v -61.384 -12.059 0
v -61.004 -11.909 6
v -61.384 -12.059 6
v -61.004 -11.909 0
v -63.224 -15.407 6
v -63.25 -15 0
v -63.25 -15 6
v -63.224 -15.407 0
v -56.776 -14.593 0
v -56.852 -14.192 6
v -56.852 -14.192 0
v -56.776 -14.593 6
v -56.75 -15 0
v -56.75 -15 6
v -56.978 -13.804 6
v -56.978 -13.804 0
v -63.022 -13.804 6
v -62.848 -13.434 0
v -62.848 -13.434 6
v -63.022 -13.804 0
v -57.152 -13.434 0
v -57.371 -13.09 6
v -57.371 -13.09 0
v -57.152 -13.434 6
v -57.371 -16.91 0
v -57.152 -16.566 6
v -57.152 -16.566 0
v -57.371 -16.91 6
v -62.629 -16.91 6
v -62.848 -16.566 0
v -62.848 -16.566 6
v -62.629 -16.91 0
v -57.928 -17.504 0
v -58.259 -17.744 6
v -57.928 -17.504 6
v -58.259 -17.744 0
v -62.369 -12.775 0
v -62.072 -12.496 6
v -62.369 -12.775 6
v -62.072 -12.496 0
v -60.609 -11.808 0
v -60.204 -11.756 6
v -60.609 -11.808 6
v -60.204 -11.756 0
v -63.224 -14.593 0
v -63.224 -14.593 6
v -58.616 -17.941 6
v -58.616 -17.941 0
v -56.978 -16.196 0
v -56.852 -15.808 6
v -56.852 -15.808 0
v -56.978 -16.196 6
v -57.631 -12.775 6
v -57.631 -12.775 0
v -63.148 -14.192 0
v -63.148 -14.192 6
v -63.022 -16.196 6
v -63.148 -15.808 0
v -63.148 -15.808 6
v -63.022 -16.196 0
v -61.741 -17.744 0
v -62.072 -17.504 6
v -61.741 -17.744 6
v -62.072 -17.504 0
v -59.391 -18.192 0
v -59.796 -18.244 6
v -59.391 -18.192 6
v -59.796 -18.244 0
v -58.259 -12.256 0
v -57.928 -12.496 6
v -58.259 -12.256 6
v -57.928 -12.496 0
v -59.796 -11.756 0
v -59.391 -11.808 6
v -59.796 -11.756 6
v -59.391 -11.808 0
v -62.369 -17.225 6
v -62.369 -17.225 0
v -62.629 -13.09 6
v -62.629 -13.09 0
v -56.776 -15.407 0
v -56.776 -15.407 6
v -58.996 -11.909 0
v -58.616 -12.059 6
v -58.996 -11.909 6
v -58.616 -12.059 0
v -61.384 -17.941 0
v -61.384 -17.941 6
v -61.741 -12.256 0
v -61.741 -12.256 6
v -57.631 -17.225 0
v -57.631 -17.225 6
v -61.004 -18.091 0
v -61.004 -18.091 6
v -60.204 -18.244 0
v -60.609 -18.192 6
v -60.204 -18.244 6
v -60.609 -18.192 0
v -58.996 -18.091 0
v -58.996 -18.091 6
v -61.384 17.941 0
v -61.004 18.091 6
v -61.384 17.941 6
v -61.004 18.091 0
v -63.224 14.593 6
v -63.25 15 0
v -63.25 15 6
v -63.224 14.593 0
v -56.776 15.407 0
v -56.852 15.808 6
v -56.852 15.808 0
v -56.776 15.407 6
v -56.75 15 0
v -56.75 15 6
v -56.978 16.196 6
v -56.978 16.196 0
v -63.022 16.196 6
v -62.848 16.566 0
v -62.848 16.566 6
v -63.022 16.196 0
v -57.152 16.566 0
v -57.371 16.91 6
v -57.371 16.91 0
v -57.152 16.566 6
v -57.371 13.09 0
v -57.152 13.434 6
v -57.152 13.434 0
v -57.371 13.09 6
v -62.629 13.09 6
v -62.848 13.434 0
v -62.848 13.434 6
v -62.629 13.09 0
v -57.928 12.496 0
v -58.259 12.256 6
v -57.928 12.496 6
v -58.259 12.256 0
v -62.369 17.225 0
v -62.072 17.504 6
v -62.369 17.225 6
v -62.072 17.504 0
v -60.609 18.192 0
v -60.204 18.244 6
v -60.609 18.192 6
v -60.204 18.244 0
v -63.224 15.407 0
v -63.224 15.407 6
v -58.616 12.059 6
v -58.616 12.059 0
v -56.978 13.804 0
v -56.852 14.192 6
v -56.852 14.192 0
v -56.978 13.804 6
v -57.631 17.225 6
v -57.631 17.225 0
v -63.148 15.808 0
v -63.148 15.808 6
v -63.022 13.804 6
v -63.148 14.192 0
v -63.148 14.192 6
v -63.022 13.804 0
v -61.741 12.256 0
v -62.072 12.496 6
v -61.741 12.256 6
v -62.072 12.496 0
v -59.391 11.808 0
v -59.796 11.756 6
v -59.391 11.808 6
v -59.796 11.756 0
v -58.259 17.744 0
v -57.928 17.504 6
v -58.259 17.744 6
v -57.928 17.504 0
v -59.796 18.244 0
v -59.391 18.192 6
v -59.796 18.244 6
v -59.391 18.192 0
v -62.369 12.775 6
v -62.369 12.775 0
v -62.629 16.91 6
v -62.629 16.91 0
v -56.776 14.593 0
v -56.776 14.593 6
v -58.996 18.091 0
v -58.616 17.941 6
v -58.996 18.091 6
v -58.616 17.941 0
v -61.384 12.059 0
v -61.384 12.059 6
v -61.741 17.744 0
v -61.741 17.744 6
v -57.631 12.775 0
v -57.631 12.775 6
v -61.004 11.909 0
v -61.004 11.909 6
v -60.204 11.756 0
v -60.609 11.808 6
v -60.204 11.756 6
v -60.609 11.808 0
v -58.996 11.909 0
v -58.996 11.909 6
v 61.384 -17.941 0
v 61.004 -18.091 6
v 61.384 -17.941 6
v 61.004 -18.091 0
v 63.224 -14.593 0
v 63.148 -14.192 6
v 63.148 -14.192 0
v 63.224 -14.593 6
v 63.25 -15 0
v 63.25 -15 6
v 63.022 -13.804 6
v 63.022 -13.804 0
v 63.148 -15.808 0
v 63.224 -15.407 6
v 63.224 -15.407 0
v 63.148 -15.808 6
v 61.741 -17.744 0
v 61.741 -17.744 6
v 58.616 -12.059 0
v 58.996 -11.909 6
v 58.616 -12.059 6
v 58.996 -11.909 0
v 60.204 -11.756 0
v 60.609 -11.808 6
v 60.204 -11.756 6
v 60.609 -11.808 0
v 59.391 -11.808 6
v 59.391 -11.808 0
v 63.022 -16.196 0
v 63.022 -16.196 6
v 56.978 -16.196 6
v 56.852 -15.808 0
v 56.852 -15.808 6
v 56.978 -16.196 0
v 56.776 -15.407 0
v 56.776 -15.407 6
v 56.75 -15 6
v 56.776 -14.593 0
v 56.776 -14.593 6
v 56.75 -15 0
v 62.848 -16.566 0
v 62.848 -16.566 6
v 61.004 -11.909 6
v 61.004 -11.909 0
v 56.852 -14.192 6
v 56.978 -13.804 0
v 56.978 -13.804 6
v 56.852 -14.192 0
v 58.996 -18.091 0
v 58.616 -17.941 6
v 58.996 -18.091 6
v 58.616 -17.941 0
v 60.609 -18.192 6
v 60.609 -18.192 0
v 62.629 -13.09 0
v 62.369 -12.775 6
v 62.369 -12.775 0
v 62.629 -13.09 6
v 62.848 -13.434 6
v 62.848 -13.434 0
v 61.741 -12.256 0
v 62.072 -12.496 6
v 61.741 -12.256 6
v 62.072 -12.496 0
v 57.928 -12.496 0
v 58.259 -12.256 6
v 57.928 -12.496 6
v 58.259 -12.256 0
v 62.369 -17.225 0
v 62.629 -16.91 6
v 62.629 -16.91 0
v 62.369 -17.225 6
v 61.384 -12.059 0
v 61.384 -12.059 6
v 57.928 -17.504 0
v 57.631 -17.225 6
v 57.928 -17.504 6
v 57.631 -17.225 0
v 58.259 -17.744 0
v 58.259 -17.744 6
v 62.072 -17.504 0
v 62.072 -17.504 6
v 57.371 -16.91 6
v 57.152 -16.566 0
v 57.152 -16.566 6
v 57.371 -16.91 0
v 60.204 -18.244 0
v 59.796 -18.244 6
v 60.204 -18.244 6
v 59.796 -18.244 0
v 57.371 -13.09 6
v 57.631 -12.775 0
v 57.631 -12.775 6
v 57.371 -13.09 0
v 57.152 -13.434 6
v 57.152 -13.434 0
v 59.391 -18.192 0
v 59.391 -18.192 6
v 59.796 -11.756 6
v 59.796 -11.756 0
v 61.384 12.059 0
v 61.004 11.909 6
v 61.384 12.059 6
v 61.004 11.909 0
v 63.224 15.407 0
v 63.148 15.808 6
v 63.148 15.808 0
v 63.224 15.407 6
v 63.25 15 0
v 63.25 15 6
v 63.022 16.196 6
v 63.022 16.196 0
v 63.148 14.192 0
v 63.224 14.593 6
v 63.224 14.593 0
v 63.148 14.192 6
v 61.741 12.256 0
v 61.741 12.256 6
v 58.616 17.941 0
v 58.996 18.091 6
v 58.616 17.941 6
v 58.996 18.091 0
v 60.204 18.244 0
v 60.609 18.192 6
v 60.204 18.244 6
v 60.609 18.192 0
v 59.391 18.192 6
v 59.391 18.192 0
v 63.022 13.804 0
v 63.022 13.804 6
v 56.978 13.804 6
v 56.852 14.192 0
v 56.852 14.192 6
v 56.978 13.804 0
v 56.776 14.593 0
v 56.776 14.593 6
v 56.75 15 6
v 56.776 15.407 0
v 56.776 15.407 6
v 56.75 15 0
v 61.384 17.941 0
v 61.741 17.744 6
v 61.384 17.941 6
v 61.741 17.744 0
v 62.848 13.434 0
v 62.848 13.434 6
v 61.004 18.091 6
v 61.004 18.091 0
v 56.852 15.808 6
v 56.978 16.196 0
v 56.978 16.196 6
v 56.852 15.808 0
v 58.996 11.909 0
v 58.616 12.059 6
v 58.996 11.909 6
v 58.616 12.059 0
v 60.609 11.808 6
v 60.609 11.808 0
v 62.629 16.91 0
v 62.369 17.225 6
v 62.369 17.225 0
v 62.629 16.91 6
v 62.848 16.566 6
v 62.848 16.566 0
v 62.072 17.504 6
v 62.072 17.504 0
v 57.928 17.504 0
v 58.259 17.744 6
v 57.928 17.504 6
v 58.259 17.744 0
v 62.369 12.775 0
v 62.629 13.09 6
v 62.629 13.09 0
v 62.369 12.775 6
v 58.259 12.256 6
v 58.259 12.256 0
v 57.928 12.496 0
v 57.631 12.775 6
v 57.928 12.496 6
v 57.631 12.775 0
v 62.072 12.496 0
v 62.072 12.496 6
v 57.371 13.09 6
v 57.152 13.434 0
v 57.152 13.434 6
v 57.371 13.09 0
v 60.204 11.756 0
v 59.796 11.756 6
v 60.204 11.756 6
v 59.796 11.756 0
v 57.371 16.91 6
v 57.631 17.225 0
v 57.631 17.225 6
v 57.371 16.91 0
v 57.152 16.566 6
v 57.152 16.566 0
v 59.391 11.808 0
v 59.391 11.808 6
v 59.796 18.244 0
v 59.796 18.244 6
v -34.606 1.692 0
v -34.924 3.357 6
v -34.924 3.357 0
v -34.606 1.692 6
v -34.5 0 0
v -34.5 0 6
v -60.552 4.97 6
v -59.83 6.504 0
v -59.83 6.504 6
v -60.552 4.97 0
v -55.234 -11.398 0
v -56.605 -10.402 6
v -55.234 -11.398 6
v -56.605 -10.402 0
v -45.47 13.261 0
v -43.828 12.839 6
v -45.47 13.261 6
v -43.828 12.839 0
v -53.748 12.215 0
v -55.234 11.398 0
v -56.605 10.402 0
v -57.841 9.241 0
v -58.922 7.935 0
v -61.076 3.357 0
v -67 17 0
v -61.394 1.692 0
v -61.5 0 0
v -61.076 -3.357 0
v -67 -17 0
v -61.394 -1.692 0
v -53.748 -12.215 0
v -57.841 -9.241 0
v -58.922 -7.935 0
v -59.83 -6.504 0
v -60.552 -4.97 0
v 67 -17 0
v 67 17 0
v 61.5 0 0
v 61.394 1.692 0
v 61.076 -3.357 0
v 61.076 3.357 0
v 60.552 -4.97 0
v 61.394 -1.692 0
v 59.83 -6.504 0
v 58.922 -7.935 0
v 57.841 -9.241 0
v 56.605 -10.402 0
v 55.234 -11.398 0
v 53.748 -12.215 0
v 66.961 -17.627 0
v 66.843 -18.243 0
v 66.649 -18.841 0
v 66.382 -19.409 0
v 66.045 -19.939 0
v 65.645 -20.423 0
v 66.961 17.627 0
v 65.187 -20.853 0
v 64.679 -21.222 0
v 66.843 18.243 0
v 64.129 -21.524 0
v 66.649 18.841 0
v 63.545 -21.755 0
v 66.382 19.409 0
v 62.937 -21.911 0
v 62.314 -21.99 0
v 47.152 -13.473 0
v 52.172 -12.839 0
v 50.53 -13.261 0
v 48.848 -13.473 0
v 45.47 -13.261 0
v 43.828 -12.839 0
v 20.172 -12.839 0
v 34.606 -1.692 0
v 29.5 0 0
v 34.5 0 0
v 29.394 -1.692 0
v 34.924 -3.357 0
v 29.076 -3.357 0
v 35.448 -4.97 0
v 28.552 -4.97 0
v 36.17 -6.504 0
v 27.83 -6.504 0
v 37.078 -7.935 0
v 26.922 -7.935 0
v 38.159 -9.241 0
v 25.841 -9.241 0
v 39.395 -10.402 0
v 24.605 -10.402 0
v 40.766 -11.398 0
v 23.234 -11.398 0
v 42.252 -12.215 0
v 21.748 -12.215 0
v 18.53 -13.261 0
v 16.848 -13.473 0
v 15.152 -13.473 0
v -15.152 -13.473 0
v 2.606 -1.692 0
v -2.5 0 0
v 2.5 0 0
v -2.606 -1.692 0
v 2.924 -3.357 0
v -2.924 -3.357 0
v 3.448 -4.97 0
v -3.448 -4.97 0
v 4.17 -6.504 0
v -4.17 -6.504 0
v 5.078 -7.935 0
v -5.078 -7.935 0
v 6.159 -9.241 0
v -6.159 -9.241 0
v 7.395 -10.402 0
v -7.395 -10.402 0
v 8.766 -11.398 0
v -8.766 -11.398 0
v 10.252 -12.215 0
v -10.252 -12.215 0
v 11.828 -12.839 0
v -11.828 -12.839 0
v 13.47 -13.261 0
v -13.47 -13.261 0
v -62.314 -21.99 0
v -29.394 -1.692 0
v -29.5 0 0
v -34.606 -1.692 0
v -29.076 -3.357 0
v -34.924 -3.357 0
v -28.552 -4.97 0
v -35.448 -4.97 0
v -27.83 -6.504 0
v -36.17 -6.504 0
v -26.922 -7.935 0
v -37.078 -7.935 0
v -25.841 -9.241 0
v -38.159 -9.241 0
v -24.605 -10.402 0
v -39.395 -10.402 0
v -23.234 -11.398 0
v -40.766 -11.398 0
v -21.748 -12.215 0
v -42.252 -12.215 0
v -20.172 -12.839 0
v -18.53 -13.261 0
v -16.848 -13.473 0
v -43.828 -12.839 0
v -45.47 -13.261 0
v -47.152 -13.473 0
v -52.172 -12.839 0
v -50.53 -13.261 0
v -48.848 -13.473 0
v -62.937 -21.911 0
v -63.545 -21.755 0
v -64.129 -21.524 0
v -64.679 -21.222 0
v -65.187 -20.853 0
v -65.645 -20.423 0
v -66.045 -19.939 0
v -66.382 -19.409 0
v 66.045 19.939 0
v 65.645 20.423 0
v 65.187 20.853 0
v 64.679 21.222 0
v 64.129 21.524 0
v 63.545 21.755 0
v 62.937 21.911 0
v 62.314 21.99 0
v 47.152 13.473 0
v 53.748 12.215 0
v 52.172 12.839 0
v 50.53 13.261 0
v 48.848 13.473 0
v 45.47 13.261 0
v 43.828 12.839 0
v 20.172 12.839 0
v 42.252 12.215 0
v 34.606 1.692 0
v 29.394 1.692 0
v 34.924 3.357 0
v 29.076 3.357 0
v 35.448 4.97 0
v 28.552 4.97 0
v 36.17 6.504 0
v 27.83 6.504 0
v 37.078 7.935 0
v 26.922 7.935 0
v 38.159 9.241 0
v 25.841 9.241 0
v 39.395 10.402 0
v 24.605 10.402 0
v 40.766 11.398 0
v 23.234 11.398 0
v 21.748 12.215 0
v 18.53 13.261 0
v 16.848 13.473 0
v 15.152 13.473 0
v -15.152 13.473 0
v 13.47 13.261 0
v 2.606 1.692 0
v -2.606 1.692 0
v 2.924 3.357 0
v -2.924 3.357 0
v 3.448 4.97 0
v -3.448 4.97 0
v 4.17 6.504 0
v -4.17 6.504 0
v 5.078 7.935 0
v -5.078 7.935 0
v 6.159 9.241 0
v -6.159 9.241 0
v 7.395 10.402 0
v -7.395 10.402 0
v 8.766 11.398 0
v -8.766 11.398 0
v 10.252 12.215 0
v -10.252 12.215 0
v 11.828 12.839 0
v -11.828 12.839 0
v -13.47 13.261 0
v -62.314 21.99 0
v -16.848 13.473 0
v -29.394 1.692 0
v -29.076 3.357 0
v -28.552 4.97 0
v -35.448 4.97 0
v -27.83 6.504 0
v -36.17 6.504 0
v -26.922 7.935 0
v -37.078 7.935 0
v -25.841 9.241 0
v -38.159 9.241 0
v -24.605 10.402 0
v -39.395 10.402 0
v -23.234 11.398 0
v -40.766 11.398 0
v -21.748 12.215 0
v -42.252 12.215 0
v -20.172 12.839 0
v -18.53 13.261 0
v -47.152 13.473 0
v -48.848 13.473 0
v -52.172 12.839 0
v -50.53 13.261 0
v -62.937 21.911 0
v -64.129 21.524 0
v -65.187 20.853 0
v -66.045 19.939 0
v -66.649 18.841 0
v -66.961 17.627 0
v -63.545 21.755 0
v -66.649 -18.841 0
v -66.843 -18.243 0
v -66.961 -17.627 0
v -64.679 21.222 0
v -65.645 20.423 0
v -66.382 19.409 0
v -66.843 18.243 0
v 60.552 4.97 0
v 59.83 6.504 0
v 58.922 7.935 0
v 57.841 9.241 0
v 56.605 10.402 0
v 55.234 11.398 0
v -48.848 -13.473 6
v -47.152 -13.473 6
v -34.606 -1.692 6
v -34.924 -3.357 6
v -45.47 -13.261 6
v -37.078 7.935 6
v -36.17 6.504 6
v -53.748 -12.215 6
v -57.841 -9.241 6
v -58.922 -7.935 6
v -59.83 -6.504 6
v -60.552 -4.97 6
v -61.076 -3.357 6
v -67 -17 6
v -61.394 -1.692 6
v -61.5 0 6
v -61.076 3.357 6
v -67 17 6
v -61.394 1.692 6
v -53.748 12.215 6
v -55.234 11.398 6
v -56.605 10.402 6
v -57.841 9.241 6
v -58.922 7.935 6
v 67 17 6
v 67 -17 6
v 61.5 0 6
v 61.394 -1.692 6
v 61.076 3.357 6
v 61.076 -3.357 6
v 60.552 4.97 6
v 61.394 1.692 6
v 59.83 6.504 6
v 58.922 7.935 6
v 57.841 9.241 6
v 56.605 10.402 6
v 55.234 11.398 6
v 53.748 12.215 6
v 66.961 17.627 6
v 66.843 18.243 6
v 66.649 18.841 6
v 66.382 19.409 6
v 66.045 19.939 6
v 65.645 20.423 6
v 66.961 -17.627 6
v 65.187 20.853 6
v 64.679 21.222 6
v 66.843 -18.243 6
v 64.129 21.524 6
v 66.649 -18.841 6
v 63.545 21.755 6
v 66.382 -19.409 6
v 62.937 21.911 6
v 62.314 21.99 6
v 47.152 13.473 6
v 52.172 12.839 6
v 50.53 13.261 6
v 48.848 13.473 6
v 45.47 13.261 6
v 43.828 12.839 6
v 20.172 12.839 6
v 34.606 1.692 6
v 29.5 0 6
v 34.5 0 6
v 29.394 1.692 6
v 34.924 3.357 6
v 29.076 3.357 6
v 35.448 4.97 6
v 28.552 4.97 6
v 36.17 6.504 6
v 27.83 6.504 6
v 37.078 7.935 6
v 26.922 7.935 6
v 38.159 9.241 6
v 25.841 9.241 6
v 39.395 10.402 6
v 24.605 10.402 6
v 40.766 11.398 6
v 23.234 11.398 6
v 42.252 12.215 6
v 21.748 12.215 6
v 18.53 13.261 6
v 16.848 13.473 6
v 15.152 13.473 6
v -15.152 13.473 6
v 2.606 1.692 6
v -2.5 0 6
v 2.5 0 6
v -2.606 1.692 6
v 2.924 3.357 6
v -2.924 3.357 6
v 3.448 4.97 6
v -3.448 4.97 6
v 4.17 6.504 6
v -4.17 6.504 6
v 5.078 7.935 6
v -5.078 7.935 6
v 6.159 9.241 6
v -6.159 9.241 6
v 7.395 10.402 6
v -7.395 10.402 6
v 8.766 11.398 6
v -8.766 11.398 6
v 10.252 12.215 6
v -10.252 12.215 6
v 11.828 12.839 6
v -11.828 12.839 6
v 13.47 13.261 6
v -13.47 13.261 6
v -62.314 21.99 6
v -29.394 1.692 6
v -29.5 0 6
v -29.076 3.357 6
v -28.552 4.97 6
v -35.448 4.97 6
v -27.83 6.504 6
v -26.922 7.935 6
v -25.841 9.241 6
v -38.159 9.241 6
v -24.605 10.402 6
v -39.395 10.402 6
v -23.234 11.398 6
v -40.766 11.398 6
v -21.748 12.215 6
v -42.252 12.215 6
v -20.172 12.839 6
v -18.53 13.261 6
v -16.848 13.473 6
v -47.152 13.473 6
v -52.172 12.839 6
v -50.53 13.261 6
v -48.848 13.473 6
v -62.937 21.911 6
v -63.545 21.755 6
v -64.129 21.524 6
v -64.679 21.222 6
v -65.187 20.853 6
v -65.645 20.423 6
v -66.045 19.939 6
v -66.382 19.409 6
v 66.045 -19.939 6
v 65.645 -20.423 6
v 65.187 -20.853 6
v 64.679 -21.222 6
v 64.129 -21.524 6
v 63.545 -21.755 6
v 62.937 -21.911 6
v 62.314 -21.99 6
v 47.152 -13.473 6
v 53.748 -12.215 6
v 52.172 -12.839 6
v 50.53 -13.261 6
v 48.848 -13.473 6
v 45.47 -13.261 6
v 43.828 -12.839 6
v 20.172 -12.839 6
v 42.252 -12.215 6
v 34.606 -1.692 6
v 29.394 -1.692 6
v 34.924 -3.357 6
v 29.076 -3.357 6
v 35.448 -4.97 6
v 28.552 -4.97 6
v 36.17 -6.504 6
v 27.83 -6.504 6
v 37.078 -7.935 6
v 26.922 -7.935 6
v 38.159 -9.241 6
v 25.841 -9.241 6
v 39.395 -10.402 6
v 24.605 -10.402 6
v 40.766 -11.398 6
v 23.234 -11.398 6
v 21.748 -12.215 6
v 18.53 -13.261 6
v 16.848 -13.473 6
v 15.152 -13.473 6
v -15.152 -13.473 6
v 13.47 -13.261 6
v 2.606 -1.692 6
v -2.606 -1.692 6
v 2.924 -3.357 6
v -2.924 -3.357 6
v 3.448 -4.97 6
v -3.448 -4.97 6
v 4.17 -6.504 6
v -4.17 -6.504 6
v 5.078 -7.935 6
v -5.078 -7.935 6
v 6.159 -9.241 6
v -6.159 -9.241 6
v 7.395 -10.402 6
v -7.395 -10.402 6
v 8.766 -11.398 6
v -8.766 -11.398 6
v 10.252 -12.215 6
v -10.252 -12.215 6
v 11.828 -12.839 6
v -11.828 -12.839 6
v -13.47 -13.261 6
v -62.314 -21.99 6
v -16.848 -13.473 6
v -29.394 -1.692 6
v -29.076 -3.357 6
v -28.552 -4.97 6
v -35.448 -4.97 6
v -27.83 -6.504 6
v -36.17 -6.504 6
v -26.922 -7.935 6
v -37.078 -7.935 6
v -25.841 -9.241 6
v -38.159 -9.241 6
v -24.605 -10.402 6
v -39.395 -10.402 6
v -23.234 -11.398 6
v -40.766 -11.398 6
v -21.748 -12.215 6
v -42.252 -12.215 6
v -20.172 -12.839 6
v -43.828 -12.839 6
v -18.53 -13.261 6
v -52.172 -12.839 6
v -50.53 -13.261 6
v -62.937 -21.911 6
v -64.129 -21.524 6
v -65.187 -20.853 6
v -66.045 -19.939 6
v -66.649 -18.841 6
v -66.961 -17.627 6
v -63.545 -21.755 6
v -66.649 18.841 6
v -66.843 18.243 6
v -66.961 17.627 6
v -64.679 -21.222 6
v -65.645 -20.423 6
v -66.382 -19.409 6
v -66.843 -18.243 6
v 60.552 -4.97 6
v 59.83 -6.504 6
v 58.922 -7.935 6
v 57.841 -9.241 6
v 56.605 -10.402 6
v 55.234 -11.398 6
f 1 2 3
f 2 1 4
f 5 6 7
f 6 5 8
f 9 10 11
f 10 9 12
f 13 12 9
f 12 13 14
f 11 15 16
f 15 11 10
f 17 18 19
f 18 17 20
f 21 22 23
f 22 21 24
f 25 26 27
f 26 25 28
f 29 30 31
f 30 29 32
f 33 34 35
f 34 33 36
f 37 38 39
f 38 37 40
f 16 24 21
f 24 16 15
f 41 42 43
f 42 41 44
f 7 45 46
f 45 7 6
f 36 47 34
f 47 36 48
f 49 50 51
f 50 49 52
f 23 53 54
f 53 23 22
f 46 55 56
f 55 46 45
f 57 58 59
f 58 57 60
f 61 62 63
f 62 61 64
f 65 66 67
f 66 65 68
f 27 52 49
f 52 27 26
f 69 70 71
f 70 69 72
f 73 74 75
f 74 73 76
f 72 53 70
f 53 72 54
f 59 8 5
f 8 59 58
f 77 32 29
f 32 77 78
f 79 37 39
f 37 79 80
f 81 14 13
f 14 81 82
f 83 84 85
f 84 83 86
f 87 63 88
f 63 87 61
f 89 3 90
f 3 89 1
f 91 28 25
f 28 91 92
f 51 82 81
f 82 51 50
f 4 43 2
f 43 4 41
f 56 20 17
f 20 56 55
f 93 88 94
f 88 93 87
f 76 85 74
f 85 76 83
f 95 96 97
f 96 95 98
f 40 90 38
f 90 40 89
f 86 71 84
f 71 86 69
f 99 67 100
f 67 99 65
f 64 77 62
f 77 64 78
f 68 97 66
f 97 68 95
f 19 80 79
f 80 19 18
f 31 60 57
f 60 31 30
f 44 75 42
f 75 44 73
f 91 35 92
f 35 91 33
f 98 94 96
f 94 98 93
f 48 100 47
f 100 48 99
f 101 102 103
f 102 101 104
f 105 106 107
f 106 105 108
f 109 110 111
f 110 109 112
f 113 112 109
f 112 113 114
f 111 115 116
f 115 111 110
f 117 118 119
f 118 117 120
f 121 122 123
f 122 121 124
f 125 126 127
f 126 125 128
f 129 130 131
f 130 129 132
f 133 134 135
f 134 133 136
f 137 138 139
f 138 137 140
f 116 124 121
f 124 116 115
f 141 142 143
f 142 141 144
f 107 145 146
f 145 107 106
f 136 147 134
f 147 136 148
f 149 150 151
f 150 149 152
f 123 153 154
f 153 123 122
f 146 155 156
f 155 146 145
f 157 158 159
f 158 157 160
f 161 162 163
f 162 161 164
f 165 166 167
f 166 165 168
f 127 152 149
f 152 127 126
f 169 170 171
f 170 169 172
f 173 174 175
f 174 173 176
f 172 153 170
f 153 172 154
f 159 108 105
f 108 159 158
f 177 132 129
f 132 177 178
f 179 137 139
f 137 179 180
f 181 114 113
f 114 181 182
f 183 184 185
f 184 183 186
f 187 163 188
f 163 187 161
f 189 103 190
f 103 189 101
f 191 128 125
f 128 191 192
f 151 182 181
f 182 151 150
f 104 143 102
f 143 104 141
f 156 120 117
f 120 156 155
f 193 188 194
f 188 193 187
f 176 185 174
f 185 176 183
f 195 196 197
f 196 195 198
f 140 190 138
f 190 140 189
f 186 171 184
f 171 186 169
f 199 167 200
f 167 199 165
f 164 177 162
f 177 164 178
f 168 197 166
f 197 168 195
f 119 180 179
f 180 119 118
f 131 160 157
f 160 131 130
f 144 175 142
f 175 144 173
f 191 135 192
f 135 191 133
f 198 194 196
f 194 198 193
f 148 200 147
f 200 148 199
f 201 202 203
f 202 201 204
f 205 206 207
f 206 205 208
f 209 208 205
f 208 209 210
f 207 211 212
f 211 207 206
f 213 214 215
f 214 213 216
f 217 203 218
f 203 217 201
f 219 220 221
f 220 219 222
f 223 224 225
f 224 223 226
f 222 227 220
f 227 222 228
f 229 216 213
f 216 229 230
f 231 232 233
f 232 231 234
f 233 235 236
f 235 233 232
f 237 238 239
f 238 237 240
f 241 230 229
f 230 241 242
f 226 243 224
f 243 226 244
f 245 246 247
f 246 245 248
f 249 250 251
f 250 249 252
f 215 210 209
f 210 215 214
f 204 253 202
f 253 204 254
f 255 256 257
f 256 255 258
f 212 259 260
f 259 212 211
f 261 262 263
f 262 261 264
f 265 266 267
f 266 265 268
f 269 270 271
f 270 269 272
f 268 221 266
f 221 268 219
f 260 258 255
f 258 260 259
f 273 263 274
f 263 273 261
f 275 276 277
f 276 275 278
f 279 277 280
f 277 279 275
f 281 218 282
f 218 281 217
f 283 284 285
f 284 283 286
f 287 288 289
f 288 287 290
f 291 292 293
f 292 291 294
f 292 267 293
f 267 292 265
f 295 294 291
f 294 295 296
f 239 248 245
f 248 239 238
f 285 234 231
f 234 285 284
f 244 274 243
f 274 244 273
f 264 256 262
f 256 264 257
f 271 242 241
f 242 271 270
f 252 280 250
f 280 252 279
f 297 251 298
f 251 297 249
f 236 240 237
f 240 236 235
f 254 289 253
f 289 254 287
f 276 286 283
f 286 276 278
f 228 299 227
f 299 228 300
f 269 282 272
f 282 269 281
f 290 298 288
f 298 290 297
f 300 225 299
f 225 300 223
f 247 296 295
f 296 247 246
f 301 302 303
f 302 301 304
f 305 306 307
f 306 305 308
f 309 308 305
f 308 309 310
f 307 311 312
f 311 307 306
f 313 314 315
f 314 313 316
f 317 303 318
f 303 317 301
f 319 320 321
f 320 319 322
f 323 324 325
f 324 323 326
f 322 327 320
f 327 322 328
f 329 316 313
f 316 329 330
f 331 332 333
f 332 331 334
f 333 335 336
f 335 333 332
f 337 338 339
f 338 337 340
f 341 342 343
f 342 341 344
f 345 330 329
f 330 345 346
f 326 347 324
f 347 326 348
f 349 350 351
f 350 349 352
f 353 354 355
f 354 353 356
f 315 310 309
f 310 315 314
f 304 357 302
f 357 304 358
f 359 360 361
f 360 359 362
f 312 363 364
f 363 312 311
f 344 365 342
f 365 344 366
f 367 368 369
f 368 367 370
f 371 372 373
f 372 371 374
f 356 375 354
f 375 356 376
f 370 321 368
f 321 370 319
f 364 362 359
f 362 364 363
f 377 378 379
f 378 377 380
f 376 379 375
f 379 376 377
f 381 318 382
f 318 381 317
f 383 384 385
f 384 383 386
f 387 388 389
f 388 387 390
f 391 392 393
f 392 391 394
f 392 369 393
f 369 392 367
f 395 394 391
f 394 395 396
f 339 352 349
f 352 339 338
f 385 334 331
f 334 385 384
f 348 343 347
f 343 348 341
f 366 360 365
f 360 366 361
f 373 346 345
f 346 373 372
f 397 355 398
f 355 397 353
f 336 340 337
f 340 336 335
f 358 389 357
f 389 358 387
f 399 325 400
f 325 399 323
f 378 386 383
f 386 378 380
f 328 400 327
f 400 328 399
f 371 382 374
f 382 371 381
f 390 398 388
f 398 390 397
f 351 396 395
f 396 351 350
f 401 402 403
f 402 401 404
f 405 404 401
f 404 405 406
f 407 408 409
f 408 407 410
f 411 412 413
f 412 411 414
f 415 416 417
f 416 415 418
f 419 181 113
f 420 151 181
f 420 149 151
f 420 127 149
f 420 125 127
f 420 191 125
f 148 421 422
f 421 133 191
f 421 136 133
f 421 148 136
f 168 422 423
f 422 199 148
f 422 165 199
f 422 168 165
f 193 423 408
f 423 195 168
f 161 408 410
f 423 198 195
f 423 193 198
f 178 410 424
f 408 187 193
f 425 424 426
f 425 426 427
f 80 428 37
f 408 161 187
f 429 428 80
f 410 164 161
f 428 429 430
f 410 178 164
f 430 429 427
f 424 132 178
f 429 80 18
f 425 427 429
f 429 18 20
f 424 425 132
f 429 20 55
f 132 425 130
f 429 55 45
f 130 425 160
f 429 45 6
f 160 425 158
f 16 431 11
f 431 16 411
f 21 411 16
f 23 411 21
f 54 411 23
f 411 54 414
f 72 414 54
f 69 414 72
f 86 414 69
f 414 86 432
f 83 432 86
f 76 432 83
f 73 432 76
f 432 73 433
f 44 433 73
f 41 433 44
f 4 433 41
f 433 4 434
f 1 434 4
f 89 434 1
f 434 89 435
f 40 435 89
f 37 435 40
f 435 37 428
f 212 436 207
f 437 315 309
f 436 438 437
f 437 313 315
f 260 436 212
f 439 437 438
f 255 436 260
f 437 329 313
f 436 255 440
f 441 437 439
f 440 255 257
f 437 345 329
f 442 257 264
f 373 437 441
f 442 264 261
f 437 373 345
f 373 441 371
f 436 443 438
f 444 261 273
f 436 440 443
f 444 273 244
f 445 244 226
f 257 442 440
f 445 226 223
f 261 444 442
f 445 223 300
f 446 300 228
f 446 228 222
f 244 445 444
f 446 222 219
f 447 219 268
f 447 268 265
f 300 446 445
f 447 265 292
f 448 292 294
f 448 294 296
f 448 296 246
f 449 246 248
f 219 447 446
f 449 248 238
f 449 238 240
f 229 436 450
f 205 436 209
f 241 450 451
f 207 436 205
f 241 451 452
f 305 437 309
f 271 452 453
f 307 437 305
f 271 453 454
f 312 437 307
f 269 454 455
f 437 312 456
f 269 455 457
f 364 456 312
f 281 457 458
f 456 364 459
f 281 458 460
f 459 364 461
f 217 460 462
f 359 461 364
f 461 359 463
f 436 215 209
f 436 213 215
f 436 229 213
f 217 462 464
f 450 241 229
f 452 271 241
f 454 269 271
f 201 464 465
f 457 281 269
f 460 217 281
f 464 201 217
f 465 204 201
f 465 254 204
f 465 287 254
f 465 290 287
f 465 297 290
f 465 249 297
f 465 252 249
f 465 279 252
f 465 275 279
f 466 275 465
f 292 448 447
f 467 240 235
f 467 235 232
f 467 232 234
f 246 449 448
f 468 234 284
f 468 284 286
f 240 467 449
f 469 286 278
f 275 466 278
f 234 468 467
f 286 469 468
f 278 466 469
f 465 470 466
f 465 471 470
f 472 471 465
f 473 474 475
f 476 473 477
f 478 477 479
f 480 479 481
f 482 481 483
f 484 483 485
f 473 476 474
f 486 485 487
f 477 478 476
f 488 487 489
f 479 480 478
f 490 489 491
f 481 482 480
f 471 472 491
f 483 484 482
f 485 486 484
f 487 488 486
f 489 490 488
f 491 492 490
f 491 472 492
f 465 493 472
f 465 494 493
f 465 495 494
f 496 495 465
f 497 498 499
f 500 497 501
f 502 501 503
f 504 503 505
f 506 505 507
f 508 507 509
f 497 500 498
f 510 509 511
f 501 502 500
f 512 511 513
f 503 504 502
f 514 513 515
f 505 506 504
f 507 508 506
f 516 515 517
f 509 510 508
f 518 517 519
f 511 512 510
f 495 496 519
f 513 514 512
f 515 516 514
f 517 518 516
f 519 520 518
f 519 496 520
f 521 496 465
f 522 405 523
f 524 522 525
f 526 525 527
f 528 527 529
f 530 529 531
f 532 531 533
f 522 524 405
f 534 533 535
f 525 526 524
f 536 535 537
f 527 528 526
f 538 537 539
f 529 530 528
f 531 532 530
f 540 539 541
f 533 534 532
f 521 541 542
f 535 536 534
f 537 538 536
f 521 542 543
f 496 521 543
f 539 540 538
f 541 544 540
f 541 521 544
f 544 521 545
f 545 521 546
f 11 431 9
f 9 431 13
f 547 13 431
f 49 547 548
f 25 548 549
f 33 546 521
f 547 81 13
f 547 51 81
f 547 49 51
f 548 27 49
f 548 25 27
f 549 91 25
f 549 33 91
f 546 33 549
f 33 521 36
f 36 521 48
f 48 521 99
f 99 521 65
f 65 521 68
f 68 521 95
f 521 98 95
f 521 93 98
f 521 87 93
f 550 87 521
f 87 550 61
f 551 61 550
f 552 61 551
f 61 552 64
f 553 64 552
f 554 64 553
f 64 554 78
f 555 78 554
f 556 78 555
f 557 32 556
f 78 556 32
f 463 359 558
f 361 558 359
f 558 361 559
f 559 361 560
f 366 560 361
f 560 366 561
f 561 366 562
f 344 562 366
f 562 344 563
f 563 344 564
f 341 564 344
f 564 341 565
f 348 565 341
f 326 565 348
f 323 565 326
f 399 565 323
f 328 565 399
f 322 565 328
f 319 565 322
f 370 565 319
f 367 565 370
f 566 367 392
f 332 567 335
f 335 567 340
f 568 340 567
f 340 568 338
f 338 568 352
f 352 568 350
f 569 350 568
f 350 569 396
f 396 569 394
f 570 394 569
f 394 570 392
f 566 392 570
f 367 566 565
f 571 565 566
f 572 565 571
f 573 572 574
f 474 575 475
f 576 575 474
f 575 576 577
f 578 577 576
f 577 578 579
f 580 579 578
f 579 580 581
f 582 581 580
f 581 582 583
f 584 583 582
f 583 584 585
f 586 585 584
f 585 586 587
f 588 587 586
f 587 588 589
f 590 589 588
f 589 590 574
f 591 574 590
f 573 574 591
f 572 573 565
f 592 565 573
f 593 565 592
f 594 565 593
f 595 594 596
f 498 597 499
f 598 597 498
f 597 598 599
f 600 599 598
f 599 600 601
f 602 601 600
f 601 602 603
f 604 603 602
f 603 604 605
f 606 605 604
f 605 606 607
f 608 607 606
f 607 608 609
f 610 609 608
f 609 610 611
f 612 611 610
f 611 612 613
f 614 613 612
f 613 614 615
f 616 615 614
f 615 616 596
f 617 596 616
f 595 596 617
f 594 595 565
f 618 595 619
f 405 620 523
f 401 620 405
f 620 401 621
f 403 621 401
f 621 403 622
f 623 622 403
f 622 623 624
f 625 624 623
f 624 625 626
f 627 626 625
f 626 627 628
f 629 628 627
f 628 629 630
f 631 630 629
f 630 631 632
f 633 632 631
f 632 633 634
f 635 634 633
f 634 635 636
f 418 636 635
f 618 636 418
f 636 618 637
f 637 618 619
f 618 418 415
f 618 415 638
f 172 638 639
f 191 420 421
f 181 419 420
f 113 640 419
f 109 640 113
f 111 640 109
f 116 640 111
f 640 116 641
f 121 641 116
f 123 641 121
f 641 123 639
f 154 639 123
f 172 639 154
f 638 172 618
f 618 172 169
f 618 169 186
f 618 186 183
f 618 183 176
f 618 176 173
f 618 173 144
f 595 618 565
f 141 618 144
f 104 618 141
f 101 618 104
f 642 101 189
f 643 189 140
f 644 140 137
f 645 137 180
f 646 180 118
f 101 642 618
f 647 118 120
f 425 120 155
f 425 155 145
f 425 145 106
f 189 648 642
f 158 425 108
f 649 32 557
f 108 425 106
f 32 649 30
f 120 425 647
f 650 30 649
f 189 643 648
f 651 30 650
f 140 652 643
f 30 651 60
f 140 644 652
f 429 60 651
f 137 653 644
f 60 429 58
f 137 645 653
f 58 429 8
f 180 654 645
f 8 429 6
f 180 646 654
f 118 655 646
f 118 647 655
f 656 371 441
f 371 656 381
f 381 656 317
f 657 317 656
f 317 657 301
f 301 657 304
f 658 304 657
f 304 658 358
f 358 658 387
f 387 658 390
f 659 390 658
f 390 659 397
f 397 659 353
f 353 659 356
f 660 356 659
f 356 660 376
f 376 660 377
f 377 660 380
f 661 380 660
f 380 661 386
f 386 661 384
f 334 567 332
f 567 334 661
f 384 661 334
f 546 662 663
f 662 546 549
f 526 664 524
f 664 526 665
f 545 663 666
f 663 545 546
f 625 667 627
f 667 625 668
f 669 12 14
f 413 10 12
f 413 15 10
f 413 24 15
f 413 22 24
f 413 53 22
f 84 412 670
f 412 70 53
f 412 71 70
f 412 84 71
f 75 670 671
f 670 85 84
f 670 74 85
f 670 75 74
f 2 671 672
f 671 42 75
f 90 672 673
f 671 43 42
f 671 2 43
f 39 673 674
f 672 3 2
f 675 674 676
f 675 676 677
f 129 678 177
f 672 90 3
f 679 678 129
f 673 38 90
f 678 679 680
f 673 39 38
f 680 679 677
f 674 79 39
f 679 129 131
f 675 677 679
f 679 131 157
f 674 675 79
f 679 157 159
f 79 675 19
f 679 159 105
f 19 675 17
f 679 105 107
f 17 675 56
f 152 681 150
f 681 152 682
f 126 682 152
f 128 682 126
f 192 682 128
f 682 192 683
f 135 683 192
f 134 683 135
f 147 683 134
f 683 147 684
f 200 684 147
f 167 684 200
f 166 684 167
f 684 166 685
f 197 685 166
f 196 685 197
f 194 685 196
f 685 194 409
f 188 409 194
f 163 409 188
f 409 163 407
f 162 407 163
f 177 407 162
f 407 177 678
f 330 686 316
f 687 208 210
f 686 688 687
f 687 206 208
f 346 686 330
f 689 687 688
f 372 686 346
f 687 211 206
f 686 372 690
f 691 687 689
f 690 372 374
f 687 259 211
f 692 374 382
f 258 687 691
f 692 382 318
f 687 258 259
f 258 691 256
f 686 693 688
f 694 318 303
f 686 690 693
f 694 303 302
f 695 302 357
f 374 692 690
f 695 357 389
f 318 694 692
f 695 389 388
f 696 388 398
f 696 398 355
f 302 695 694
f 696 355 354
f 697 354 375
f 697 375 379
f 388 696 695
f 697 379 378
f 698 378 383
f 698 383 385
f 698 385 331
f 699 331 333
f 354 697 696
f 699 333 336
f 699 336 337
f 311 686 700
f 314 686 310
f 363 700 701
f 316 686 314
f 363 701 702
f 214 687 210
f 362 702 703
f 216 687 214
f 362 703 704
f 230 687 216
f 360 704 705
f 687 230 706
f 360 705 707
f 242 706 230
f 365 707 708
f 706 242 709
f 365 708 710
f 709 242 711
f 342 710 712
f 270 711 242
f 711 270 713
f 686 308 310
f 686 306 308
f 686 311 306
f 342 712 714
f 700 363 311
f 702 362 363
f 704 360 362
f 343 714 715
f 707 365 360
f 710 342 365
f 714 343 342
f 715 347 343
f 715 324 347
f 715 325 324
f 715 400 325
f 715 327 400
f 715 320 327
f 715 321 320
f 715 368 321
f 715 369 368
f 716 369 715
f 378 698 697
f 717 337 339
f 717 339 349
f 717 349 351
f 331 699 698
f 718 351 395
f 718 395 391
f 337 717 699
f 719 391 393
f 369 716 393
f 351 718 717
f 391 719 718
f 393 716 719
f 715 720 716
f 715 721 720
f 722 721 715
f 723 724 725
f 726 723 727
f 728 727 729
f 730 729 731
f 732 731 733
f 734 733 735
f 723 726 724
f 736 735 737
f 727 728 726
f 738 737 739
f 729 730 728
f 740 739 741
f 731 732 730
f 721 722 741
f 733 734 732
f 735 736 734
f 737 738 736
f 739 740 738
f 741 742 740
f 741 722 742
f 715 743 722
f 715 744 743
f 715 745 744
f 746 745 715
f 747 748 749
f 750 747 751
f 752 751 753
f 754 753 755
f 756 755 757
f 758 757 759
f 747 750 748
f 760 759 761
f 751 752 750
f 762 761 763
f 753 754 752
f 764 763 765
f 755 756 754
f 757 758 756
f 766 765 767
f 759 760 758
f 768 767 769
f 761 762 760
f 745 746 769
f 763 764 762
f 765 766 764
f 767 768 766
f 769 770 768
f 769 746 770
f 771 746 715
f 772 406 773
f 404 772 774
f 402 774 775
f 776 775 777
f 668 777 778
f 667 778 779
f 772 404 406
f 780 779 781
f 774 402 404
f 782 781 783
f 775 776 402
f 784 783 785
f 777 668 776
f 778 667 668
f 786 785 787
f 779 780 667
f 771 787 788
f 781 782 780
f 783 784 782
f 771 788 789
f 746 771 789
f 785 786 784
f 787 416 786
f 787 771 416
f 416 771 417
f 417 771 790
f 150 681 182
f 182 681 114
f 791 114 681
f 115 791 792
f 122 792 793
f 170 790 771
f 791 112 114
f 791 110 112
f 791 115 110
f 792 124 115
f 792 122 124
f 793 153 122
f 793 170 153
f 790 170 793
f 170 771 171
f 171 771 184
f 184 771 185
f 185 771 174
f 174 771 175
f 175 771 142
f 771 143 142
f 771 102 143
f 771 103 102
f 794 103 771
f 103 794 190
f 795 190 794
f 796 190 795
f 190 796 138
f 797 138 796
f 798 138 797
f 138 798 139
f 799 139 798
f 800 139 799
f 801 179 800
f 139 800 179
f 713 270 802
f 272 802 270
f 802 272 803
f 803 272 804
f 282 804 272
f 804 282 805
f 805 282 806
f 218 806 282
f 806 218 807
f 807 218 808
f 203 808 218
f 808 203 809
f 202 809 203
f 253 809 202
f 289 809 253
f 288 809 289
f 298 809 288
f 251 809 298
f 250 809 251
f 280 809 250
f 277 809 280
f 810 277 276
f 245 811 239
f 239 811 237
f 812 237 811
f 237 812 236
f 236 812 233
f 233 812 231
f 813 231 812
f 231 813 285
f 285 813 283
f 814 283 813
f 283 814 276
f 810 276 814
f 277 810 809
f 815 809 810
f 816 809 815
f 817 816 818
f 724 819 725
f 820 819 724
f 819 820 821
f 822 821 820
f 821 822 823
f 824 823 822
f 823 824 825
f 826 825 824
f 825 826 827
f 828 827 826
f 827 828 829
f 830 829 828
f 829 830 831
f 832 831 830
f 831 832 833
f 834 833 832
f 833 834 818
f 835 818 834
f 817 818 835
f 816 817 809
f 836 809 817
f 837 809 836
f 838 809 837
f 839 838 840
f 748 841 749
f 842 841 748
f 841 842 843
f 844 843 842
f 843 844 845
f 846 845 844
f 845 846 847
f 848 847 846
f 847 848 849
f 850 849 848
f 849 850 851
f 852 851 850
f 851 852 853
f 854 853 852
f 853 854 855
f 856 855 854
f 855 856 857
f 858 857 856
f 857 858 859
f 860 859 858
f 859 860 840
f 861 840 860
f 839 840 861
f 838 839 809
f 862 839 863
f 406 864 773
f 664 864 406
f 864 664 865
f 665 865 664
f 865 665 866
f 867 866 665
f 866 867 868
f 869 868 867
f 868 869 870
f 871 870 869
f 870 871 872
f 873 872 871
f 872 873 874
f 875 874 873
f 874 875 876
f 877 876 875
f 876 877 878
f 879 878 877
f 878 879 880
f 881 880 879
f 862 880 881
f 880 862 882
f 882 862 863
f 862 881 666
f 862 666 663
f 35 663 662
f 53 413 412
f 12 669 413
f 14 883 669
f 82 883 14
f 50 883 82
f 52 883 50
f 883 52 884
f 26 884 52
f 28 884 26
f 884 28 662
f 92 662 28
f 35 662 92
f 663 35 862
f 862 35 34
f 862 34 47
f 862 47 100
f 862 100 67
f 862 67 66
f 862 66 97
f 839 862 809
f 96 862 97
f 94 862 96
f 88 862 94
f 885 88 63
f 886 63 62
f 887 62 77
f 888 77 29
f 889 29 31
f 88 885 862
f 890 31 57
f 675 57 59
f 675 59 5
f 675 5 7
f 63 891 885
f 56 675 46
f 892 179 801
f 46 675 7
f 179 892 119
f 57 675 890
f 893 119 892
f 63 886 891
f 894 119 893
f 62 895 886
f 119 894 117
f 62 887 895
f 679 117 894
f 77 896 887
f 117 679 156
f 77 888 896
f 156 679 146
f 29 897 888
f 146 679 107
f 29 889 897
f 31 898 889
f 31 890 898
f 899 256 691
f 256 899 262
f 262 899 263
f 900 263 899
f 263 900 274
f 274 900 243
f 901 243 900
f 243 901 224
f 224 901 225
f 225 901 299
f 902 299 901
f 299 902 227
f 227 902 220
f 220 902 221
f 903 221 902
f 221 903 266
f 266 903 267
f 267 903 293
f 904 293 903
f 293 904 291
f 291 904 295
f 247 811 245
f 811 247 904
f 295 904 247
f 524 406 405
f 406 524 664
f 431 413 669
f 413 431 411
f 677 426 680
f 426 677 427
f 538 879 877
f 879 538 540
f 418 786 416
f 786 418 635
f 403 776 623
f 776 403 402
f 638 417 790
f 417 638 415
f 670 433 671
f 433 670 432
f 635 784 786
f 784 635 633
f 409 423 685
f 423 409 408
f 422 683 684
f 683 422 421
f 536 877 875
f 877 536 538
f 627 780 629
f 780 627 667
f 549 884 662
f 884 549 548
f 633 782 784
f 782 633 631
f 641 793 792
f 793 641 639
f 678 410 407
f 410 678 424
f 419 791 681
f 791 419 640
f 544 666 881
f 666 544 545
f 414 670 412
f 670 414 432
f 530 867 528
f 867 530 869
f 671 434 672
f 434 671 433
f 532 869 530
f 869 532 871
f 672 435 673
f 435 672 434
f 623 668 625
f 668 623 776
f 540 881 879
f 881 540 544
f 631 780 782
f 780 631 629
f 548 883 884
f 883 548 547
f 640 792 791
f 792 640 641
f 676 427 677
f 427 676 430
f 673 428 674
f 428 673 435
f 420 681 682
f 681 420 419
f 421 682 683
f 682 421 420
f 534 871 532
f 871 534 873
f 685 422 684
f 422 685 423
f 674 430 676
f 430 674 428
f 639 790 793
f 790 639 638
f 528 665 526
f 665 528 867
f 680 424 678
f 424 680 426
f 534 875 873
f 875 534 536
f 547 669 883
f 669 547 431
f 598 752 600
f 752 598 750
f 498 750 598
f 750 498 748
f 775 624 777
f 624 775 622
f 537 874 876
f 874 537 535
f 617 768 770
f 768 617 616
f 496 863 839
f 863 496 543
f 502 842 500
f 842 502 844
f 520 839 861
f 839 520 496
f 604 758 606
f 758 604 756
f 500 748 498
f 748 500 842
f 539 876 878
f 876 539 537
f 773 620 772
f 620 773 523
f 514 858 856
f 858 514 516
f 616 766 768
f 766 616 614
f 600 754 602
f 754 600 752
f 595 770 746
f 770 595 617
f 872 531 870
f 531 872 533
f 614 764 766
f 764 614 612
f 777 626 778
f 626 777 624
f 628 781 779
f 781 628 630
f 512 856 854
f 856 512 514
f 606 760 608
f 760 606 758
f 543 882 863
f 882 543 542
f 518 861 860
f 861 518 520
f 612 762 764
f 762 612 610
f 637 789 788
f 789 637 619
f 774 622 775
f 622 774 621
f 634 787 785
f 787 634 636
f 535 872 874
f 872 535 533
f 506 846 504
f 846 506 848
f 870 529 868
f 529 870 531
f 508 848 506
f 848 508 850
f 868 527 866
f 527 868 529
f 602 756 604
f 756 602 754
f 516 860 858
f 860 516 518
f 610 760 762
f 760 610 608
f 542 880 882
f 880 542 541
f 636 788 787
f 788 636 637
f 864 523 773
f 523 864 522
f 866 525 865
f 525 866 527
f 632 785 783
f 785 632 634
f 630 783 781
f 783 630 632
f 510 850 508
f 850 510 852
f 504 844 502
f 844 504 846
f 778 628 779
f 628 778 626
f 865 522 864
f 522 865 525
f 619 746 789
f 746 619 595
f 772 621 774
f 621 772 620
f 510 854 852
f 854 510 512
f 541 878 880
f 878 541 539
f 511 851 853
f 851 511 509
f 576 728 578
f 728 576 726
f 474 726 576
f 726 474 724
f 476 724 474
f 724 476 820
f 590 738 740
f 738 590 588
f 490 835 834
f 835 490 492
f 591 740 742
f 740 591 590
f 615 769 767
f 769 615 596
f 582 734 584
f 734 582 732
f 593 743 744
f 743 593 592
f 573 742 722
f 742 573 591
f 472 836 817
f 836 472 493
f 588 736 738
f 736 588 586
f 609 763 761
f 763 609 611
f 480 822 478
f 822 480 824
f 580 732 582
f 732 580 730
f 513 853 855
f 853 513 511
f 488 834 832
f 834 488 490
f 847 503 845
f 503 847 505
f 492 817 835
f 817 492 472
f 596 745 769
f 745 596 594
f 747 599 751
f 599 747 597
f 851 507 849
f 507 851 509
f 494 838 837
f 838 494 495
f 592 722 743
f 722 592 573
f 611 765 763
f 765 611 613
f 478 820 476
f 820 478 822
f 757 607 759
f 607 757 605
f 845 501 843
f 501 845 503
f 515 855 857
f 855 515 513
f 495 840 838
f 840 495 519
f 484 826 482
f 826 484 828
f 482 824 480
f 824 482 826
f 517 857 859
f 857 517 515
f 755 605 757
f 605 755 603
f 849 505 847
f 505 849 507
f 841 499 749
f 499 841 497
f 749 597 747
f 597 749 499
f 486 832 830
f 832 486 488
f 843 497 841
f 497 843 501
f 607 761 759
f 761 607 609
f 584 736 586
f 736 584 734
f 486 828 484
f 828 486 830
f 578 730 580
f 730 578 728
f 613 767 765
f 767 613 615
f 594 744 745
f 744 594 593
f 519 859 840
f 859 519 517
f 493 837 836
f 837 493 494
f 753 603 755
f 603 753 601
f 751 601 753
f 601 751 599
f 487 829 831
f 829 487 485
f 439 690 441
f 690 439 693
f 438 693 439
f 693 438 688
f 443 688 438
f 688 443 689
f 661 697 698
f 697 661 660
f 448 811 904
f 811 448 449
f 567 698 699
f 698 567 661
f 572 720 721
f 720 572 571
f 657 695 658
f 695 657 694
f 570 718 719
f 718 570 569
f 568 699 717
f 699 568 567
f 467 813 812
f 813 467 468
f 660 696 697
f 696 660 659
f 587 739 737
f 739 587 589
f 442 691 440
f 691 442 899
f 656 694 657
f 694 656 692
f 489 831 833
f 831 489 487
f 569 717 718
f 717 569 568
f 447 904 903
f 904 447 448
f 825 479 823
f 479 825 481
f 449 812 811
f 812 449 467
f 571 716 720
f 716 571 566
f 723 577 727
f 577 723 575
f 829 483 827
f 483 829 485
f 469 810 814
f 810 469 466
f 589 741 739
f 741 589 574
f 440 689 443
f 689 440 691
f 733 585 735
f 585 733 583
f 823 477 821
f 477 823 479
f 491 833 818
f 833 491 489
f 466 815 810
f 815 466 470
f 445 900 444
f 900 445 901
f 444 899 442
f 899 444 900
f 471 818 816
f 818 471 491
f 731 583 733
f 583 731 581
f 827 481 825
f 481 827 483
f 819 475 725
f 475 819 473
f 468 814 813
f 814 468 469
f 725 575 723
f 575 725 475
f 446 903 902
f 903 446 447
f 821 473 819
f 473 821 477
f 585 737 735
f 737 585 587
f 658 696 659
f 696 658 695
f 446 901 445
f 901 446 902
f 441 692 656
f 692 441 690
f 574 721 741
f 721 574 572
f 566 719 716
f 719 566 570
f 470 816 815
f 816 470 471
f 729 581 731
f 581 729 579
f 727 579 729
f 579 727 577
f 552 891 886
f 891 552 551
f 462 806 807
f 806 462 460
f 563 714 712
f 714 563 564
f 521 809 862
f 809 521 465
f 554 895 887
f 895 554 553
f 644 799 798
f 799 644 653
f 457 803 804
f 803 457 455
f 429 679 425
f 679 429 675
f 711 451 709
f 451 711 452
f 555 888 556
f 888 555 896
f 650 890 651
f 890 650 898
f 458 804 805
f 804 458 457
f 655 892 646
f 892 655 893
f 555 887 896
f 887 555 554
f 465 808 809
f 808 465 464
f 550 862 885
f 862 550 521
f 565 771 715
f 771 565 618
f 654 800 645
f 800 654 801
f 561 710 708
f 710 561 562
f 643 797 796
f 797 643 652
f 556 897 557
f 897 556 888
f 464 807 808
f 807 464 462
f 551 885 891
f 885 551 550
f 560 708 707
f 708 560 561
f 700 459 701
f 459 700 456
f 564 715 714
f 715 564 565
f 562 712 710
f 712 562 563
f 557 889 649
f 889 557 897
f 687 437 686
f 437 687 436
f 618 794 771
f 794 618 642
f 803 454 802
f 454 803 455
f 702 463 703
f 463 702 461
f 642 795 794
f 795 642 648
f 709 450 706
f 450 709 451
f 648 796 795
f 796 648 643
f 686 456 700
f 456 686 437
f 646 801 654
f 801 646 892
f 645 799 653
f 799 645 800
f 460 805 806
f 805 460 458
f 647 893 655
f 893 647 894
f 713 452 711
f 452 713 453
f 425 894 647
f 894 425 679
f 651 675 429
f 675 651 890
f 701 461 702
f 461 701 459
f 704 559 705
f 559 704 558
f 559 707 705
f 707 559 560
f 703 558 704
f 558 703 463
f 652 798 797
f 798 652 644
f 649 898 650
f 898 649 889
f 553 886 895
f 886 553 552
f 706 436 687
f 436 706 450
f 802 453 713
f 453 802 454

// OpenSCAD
$fn = 50;

difference() {
	union() {
		hull() {
			translate(v = [-62.0, 17.0, 0]) {
				cylinder(h = 6, r = 5);
			}
			translate(v = [62.0, 17.0, 0]) {
				cylinder(h = 6, r = 5);
			}
			translate(v = [-62.0, -17.0, 0]) {
				cylinder(h = 6, r = 5);
			}
			translate(v = [62.0, -17.0, 0]) {
				cylinder(h = 6, r = 5);
			}
		}
	}
	union() {
		translate(v = [-60.0, -15.0, -100.0]) {
			cylinder(h = 200, r = 3.25);
		}
		translate(v = [-60.0, 15.0, -100.0]) {
			cylinder(h = 200, r = 3.25);
		}
		translate(v = [60.0, -15.0, -100.0]) {
			cylinder(h = 200, r = 3.25);
		}
		translate(v = [60.0, 15.0, -100.0]) {
			cylinder(h = 200, r = 3.25);
		}
		translate(v = [-60.0, -15.0, -100.0]) {
			cylinder(h = 200, r = 1.8);
		}
		translate(v = [-60.0, 15.0, -100.0]) {
			cylinder(h = 200, r = 1.8);
		}
		translate(v = [60.0, -15.0, -100.0]) {
			cylinder(h = 200, r = 1.8);
		}
		translate(v = [60.0, 15.0, -100.0]) {
			cylinder(h = 200, r = 1.8);
		}
		translate(v = [-48.0, 0, 0.0]) {
			cylinder(h = 6, r = 13.5);
		}
		translate(v = [-16.0, 0, 0.0]) {
			cylinder(h = 6, r = 13.5);
		}
		translate(v = [16.0, 0, 0.0]) {
			cylinder(h = 6, r = 13.5);
		}
		translate(v = [48.0, 0, 0.0]) {
			cylinder(h = 6, r = 13.5);
		}
	}
}
